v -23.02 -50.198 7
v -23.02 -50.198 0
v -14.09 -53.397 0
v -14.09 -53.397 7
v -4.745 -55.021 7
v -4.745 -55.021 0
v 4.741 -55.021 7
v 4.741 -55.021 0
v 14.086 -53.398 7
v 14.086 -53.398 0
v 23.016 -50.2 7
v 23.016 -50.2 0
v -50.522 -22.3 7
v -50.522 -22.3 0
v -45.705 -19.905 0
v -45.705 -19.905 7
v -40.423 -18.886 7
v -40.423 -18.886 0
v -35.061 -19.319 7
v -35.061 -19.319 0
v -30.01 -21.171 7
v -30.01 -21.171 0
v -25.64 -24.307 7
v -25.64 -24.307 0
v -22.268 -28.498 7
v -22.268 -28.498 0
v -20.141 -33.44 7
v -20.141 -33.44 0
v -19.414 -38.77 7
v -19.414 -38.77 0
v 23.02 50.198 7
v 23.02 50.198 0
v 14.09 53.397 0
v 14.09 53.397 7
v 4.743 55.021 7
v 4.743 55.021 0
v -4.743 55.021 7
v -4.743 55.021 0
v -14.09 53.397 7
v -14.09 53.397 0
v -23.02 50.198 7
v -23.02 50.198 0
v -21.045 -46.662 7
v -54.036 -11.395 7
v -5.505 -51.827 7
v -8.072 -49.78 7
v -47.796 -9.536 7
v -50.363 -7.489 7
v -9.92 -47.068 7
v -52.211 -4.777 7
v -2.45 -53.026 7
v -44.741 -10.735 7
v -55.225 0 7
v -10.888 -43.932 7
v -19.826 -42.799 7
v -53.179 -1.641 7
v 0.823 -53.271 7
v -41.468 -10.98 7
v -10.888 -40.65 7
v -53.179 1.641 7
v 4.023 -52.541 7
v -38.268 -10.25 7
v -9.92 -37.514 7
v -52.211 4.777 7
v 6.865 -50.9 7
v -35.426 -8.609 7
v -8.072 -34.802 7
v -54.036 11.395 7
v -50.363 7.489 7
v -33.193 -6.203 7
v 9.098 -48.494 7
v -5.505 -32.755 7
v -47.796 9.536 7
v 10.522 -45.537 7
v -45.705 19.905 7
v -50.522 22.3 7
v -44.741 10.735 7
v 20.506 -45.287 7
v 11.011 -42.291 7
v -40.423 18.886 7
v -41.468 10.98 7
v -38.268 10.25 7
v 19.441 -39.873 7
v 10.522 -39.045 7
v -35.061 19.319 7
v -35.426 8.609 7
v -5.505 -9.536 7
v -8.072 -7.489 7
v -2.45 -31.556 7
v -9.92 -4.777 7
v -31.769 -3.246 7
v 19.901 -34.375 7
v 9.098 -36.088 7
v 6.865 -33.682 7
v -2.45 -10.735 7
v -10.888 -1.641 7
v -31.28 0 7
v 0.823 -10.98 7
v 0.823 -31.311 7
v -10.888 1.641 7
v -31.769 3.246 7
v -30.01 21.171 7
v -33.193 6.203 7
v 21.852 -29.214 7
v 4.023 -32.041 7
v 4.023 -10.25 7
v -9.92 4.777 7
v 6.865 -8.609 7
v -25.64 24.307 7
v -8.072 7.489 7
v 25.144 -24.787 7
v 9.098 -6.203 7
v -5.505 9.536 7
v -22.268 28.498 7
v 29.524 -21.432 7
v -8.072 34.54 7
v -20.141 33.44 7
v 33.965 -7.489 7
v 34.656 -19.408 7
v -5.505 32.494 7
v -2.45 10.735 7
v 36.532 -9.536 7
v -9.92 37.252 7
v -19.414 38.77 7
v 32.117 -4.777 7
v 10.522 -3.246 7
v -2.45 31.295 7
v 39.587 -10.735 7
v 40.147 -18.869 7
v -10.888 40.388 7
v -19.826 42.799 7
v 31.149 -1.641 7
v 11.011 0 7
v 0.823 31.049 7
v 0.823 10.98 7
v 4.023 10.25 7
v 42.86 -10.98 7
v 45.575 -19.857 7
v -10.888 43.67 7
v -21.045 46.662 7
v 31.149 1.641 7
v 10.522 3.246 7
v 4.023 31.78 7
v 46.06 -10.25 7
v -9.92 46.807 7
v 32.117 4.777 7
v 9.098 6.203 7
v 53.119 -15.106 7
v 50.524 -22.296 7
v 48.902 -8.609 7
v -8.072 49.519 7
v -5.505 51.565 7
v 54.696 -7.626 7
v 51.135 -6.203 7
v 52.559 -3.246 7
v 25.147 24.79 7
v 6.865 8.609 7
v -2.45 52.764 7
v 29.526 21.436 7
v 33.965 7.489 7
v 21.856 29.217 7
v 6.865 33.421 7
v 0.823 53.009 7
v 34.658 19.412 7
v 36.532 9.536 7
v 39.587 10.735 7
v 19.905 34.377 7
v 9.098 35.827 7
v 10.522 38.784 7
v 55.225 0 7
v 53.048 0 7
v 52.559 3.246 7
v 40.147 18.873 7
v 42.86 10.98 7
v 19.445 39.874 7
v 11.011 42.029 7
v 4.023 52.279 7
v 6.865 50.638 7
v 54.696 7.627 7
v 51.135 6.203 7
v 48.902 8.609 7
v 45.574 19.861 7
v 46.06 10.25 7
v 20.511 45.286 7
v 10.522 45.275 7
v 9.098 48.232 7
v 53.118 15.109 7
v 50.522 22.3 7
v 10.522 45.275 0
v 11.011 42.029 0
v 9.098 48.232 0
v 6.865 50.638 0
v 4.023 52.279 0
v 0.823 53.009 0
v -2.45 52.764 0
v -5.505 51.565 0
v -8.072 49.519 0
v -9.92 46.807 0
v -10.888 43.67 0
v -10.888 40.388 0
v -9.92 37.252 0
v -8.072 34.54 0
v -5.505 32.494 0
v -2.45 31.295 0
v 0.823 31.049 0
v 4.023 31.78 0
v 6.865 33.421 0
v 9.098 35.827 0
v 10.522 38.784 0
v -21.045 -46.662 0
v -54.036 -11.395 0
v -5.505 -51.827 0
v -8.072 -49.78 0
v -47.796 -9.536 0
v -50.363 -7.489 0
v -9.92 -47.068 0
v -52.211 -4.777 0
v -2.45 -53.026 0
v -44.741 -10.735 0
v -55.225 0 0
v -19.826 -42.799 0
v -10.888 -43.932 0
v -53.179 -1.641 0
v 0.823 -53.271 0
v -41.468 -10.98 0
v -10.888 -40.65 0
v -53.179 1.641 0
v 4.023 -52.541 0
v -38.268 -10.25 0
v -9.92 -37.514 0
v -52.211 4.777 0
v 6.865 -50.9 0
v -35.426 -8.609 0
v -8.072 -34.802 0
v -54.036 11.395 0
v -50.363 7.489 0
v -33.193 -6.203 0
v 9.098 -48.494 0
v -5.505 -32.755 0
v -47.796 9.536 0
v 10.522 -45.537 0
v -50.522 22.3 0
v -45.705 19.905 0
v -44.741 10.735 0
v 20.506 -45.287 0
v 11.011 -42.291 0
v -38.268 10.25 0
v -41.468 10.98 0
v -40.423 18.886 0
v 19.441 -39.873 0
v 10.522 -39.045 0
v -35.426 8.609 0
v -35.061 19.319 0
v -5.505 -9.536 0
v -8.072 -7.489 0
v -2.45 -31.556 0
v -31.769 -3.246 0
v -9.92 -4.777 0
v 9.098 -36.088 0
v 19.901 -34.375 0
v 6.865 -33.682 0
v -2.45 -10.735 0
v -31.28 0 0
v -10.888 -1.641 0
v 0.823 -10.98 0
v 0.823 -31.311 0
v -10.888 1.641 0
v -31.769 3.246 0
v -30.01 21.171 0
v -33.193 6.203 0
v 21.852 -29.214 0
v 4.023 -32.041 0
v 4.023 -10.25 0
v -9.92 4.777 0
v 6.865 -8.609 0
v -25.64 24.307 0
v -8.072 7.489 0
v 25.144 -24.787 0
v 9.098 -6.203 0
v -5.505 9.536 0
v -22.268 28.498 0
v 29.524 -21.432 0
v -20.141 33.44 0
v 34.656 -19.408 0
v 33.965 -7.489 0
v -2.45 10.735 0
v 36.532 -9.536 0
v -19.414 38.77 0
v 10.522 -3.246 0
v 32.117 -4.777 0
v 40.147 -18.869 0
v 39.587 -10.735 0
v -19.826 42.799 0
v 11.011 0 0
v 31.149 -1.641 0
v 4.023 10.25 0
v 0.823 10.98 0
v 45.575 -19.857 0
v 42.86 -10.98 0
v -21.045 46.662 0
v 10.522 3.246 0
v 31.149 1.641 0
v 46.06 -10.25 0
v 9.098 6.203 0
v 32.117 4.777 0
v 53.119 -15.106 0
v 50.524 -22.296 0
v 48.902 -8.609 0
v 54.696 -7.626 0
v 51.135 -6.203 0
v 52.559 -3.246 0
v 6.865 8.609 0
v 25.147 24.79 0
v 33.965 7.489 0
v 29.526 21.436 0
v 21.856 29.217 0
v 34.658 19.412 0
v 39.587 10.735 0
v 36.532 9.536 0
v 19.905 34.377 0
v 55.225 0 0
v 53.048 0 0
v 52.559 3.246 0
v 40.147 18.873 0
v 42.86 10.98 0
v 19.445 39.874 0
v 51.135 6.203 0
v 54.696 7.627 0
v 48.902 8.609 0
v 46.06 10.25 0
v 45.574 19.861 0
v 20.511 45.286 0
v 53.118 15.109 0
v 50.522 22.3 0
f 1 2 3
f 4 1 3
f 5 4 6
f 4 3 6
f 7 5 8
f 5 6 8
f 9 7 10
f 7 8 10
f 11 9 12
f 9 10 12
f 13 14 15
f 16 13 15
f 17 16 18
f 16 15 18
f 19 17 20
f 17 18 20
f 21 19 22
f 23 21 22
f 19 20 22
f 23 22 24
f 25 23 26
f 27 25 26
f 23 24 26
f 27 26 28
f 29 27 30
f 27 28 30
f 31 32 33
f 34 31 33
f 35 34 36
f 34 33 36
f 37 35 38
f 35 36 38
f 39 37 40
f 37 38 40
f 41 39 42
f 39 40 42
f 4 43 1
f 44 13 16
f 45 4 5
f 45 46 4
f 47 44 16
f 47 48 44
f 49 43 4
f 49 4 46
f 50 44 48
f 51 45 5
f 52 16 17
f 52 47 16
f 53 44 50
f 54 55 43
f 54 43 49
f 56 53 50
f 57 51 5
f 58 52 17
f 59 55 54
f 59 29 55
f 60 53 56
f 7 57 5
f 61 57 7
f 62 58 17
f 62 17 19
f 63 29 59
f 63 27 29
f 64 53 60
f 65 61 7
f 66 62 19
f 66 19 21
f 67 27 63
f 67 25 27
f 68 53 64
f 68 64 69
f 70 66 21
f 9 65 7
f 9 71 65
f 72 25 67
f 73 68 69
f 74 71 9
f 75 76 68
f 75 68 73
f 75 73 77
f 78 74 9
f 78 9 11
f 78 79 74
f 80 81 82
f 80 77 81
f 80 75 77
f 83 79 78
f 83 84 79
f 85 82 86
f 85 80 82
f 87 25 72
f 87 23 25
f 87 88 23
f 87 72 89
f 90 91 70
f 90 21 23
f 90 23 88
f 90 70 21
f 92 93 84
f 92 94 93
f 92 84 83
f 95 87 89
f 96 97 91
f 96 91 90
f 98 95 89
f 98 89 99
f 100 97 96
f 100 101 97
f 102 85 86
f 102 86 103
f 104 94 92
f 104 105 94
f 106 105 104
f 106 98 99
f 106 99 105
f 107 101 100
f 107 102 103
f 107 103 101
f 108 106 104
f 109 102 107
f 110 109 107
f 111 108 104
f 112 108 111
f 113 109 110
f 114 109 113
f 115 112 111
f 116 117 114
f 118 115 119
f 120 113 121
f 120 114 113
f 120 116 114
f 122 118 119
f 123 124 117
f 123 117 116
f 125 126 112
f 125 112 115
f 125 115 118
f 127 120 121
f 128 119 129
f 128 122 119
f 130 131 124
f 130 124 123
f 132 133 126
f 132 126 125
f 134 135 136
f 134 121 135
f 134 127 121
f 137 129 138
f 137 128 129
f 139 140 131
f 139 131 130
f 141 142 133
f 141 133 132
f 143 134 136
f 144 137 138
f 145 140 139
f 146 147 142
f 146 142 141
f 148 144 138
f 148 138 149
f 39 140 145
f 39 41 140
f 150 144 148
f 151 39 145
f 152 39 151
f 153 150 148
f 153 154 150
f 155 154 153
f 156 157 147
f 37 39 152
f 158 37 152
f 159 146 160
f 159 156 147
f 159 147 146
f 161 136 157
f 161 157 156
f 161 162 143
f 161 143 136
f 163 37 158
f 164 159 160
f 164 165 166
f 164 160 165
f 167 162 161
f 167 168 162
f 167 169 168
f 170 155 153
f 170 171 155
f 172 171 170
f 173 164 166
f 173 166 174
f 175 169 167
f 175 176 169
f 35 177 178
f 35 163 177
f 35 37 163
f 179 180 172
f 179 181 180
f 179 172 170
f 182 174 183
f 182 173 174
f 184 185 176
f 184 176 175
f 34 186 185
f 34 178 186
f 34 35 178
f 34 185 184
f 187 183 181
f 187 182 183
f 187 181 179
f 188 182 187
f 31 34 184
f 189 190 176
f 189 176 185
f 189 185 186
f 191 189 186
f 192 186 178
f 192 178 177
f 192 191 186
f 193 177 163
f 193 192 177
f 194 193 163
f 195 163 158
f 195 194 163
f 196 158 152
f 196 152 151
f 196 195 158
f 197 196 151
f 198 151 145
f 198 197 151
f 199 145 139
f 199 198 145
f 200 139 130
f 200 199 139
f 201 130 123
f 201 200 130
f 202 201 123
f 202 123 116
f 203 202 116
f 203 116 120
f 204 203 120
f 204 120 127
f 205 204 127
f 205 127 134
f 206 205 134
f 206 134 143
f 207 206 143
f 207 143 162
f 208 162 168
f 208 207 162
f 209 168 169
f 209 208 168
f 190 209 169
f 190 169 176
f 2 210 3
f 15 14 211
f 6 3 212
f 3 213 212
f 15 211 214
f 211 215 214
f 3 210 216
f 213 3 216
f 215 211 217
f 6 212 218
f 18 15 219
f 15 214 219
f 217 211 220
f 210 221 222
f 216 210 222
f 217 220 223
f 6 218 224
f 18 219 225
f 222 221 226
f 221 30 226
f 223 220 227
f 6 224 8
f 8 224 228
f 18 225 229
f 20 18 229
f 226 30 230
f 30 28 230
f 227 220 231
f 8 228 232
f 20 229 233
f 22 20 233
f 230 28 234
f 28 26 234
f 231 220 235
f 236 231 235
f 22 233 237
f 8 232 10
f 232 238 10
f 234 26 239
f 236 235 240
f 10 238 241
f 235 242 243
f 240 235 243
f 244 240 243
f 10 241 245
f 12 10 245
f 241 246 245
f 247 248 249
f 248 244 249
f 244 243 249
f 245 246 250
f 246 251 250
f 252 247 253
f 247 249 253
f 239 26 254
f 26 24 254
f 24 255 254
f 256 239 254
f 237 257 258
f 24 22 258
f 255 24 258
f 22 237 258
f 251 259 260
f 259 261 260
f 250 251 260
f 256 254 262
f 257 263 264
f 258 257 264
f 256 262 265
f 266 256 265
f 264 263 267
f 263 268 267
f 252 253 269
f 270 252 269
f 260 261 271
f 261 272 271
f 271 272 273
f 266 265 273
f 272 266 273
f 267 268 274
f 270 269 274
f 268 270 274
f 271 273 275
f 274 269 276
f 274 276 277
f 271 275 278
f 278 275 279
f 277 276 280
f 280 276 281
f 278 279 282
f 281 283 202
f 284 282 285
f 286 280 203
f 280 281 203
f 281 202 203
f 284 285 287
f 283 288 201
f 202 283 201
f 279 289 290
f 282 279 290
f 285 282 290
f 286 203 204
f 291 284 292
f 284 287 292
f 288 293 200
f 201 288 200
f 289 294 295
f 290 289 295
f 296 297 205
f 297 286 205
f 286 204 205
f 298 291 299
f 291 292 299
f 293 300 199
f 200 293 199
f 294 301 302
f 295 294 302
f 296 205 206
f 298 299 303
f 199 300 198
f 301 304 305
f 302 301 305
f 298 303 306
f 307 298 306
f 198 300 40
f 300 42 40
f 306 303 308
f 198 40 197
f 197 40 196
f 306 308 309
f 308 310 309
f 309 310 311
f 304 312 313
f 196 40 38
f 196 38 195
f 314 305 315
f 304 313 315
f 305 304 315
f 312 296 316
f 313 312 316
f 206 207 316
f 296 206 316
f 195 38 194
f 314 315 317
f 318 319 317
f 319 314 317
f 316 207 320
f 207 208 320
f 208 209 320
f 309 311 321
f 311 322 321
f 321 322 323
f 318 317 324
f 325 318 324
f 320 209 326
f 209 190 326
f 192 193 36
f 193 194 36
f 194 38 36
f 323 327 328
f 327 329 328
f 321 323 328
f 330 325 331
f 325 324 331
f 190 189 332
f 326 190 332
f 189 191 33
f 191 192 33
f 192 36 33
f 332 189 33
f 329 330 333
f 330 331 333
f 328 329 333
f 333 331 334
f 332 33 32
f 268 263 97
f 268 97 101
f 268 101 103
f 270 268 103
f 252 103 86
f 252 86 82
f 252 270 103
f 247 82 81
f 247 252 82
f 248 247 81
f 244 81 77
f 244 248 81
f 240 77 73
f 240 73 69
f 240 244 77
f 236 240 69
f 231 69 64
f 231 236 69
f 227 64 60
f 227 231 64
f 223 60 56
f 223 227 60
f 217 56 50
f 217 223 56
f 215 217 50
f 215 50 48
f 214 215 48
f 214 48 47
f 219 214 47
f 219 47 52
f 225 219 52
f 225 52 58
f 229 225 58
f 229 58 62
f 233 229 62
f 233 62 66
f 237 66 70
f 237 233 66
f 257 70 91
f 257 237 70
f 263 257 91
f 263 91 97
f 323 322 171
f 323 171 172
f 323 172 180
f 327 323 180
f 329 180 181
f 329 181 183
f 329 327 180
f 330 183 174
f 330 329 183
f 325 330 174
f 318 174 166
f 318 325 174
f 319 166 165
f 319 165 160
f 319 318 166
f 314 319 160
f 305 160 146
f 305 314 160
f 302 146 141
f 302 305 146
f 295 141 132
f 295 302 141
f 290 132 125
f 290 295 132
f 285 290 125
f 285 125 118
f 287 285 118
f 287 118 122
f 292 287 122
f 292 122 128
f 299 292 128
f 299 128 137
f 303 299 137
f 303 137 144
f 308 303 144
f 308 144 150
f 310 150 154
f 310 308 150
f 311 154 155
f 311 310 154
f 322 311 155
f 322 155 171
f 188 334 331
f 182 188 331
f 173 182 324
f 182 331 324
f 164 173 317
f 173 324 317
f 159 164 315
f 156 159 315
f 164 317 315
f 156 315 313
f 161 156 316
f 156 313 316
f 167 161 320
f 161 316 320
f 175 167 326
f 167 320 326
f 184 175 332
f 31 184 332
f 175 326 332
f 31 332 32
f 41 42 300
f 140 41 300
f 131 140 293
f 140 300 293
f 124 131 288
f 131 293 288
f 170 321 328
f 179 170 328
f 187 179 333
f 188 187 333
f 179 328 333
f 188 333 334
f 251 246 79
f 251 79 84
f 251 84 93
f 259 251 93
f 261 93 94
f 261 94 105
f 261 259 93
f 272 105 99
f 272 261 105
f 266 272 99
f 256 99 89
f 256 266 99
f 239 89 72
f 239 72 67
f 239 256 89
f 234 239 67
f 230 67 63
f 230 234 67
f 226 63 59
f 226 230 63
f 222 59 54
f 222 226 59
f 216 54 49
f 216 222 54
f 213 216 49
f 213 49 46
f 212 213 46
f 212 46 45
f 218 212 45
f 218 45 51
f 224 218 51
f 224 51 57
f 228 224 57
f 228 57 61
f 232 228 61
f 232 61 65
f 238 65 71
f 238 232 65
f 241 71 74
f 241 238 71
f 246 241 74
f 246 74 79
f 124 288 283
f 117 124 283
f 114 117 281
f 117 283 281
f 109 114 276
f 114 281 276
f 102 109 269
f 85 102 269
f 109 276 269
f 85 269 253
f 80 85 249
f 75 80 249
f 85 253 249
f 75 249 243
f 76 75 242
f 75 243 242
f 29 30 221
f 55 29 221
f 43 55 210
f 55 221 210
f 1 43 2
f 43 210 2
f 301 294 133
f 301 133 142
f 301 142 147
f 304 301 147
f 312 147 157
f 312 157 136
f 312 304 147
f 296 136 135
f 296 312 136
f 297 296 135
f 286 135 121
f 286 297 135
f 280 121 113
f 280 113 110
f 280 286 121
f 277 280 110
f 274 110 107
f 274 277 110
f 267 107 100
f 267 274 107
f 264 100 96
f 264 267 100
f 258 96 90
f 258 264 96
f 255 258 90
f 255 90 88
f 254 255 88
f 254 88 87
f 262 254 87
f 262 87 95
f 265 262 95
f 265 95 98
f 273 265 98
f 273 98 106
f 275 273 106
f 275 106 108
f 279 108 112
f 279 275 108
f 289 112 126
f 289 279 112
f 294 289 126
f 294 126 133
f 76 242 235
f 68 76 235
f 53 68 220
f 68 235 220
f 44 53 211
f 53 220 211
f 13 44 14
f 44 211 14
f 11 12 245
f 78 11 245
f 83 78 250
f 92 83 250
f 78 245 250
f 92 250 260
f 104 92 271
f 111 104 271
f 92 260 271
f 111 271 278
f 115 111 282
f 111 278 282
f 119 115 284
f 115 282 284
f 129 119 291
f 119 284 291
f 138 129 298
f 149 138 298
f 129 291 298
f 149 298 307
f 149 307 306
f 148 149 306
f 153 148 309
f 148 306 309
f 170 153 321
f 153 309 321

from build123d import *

# Parameters (mm, degrees)
F0_R     = 11.0109
F1_DEPTH = 7


with BuildPart() as f1:
    # F0 (on Top) → F1 (new body)
    with BuildSketch(Plane.XY):
        with BuildLine():
            ThreePointArc((50.523907, -22.296429), (54.036916, -11.393316), (55.224957, 0))
            ThreePointArc((55.224957, 0), (54.036465, 11.395451), (50.522145, 22.300421))
            ThreePointArc((50.522145, 22.300421), (25.146702, 24.789823), (23.020236, 50.198253))
            ThreePointArc((23.020236, 50.198253), (0, 55.224957), (-23.020236, 50.198253))
            ThreePointArc((-23.020236, 50.198253), (-20.337253, 44.76174), (-19.414414, 38.769875))
            ThreePointArc((-19.414414, 38.769875), (-30.010396, 21.170629), (-50.522145, 22.300421))
            ThreePointArc((-50.522145, 22.300421), (-55.224957, 0), (-50.522145, -22.300421))
            ThreePointArc((-50.522145, -22.300421), (-30.010396, -21.170629), (-19.414414, -38.769875))
            ThreePointArc((-19.414414, -38.769875), (-20.337253, -44.76174), (-23.020236, -50.198253))
            ThreePointArc((-23.020236, -50.198253), (-0.002182, -55.224957), (23.016269, -50.200072))
            ThreePointArc((23.016269, -50.200072), (25.143646, -24.78681), (50.523907, -22.296429))
        make_face()
        with Locations((0, -42.291)):
            Circle(F0_R, mode=Mode.SUBTRACT)
        with Locations((-42.291, 0)):
            Circle(F0_R, mode=Mode.SUBTRACT)
        Circle(F0_R, mode=Mode.SUBTRACT)
        with Locations((0, 42.029381)):
            Circle(F0_R, mode=Mode.SUBTRACT)
        with Locations((42.037, 0)):
            Circle(F0_R, mode=Mode.SUBTRACT)
    extrude(amount=F1_DEPTH)


solid = f1.part
